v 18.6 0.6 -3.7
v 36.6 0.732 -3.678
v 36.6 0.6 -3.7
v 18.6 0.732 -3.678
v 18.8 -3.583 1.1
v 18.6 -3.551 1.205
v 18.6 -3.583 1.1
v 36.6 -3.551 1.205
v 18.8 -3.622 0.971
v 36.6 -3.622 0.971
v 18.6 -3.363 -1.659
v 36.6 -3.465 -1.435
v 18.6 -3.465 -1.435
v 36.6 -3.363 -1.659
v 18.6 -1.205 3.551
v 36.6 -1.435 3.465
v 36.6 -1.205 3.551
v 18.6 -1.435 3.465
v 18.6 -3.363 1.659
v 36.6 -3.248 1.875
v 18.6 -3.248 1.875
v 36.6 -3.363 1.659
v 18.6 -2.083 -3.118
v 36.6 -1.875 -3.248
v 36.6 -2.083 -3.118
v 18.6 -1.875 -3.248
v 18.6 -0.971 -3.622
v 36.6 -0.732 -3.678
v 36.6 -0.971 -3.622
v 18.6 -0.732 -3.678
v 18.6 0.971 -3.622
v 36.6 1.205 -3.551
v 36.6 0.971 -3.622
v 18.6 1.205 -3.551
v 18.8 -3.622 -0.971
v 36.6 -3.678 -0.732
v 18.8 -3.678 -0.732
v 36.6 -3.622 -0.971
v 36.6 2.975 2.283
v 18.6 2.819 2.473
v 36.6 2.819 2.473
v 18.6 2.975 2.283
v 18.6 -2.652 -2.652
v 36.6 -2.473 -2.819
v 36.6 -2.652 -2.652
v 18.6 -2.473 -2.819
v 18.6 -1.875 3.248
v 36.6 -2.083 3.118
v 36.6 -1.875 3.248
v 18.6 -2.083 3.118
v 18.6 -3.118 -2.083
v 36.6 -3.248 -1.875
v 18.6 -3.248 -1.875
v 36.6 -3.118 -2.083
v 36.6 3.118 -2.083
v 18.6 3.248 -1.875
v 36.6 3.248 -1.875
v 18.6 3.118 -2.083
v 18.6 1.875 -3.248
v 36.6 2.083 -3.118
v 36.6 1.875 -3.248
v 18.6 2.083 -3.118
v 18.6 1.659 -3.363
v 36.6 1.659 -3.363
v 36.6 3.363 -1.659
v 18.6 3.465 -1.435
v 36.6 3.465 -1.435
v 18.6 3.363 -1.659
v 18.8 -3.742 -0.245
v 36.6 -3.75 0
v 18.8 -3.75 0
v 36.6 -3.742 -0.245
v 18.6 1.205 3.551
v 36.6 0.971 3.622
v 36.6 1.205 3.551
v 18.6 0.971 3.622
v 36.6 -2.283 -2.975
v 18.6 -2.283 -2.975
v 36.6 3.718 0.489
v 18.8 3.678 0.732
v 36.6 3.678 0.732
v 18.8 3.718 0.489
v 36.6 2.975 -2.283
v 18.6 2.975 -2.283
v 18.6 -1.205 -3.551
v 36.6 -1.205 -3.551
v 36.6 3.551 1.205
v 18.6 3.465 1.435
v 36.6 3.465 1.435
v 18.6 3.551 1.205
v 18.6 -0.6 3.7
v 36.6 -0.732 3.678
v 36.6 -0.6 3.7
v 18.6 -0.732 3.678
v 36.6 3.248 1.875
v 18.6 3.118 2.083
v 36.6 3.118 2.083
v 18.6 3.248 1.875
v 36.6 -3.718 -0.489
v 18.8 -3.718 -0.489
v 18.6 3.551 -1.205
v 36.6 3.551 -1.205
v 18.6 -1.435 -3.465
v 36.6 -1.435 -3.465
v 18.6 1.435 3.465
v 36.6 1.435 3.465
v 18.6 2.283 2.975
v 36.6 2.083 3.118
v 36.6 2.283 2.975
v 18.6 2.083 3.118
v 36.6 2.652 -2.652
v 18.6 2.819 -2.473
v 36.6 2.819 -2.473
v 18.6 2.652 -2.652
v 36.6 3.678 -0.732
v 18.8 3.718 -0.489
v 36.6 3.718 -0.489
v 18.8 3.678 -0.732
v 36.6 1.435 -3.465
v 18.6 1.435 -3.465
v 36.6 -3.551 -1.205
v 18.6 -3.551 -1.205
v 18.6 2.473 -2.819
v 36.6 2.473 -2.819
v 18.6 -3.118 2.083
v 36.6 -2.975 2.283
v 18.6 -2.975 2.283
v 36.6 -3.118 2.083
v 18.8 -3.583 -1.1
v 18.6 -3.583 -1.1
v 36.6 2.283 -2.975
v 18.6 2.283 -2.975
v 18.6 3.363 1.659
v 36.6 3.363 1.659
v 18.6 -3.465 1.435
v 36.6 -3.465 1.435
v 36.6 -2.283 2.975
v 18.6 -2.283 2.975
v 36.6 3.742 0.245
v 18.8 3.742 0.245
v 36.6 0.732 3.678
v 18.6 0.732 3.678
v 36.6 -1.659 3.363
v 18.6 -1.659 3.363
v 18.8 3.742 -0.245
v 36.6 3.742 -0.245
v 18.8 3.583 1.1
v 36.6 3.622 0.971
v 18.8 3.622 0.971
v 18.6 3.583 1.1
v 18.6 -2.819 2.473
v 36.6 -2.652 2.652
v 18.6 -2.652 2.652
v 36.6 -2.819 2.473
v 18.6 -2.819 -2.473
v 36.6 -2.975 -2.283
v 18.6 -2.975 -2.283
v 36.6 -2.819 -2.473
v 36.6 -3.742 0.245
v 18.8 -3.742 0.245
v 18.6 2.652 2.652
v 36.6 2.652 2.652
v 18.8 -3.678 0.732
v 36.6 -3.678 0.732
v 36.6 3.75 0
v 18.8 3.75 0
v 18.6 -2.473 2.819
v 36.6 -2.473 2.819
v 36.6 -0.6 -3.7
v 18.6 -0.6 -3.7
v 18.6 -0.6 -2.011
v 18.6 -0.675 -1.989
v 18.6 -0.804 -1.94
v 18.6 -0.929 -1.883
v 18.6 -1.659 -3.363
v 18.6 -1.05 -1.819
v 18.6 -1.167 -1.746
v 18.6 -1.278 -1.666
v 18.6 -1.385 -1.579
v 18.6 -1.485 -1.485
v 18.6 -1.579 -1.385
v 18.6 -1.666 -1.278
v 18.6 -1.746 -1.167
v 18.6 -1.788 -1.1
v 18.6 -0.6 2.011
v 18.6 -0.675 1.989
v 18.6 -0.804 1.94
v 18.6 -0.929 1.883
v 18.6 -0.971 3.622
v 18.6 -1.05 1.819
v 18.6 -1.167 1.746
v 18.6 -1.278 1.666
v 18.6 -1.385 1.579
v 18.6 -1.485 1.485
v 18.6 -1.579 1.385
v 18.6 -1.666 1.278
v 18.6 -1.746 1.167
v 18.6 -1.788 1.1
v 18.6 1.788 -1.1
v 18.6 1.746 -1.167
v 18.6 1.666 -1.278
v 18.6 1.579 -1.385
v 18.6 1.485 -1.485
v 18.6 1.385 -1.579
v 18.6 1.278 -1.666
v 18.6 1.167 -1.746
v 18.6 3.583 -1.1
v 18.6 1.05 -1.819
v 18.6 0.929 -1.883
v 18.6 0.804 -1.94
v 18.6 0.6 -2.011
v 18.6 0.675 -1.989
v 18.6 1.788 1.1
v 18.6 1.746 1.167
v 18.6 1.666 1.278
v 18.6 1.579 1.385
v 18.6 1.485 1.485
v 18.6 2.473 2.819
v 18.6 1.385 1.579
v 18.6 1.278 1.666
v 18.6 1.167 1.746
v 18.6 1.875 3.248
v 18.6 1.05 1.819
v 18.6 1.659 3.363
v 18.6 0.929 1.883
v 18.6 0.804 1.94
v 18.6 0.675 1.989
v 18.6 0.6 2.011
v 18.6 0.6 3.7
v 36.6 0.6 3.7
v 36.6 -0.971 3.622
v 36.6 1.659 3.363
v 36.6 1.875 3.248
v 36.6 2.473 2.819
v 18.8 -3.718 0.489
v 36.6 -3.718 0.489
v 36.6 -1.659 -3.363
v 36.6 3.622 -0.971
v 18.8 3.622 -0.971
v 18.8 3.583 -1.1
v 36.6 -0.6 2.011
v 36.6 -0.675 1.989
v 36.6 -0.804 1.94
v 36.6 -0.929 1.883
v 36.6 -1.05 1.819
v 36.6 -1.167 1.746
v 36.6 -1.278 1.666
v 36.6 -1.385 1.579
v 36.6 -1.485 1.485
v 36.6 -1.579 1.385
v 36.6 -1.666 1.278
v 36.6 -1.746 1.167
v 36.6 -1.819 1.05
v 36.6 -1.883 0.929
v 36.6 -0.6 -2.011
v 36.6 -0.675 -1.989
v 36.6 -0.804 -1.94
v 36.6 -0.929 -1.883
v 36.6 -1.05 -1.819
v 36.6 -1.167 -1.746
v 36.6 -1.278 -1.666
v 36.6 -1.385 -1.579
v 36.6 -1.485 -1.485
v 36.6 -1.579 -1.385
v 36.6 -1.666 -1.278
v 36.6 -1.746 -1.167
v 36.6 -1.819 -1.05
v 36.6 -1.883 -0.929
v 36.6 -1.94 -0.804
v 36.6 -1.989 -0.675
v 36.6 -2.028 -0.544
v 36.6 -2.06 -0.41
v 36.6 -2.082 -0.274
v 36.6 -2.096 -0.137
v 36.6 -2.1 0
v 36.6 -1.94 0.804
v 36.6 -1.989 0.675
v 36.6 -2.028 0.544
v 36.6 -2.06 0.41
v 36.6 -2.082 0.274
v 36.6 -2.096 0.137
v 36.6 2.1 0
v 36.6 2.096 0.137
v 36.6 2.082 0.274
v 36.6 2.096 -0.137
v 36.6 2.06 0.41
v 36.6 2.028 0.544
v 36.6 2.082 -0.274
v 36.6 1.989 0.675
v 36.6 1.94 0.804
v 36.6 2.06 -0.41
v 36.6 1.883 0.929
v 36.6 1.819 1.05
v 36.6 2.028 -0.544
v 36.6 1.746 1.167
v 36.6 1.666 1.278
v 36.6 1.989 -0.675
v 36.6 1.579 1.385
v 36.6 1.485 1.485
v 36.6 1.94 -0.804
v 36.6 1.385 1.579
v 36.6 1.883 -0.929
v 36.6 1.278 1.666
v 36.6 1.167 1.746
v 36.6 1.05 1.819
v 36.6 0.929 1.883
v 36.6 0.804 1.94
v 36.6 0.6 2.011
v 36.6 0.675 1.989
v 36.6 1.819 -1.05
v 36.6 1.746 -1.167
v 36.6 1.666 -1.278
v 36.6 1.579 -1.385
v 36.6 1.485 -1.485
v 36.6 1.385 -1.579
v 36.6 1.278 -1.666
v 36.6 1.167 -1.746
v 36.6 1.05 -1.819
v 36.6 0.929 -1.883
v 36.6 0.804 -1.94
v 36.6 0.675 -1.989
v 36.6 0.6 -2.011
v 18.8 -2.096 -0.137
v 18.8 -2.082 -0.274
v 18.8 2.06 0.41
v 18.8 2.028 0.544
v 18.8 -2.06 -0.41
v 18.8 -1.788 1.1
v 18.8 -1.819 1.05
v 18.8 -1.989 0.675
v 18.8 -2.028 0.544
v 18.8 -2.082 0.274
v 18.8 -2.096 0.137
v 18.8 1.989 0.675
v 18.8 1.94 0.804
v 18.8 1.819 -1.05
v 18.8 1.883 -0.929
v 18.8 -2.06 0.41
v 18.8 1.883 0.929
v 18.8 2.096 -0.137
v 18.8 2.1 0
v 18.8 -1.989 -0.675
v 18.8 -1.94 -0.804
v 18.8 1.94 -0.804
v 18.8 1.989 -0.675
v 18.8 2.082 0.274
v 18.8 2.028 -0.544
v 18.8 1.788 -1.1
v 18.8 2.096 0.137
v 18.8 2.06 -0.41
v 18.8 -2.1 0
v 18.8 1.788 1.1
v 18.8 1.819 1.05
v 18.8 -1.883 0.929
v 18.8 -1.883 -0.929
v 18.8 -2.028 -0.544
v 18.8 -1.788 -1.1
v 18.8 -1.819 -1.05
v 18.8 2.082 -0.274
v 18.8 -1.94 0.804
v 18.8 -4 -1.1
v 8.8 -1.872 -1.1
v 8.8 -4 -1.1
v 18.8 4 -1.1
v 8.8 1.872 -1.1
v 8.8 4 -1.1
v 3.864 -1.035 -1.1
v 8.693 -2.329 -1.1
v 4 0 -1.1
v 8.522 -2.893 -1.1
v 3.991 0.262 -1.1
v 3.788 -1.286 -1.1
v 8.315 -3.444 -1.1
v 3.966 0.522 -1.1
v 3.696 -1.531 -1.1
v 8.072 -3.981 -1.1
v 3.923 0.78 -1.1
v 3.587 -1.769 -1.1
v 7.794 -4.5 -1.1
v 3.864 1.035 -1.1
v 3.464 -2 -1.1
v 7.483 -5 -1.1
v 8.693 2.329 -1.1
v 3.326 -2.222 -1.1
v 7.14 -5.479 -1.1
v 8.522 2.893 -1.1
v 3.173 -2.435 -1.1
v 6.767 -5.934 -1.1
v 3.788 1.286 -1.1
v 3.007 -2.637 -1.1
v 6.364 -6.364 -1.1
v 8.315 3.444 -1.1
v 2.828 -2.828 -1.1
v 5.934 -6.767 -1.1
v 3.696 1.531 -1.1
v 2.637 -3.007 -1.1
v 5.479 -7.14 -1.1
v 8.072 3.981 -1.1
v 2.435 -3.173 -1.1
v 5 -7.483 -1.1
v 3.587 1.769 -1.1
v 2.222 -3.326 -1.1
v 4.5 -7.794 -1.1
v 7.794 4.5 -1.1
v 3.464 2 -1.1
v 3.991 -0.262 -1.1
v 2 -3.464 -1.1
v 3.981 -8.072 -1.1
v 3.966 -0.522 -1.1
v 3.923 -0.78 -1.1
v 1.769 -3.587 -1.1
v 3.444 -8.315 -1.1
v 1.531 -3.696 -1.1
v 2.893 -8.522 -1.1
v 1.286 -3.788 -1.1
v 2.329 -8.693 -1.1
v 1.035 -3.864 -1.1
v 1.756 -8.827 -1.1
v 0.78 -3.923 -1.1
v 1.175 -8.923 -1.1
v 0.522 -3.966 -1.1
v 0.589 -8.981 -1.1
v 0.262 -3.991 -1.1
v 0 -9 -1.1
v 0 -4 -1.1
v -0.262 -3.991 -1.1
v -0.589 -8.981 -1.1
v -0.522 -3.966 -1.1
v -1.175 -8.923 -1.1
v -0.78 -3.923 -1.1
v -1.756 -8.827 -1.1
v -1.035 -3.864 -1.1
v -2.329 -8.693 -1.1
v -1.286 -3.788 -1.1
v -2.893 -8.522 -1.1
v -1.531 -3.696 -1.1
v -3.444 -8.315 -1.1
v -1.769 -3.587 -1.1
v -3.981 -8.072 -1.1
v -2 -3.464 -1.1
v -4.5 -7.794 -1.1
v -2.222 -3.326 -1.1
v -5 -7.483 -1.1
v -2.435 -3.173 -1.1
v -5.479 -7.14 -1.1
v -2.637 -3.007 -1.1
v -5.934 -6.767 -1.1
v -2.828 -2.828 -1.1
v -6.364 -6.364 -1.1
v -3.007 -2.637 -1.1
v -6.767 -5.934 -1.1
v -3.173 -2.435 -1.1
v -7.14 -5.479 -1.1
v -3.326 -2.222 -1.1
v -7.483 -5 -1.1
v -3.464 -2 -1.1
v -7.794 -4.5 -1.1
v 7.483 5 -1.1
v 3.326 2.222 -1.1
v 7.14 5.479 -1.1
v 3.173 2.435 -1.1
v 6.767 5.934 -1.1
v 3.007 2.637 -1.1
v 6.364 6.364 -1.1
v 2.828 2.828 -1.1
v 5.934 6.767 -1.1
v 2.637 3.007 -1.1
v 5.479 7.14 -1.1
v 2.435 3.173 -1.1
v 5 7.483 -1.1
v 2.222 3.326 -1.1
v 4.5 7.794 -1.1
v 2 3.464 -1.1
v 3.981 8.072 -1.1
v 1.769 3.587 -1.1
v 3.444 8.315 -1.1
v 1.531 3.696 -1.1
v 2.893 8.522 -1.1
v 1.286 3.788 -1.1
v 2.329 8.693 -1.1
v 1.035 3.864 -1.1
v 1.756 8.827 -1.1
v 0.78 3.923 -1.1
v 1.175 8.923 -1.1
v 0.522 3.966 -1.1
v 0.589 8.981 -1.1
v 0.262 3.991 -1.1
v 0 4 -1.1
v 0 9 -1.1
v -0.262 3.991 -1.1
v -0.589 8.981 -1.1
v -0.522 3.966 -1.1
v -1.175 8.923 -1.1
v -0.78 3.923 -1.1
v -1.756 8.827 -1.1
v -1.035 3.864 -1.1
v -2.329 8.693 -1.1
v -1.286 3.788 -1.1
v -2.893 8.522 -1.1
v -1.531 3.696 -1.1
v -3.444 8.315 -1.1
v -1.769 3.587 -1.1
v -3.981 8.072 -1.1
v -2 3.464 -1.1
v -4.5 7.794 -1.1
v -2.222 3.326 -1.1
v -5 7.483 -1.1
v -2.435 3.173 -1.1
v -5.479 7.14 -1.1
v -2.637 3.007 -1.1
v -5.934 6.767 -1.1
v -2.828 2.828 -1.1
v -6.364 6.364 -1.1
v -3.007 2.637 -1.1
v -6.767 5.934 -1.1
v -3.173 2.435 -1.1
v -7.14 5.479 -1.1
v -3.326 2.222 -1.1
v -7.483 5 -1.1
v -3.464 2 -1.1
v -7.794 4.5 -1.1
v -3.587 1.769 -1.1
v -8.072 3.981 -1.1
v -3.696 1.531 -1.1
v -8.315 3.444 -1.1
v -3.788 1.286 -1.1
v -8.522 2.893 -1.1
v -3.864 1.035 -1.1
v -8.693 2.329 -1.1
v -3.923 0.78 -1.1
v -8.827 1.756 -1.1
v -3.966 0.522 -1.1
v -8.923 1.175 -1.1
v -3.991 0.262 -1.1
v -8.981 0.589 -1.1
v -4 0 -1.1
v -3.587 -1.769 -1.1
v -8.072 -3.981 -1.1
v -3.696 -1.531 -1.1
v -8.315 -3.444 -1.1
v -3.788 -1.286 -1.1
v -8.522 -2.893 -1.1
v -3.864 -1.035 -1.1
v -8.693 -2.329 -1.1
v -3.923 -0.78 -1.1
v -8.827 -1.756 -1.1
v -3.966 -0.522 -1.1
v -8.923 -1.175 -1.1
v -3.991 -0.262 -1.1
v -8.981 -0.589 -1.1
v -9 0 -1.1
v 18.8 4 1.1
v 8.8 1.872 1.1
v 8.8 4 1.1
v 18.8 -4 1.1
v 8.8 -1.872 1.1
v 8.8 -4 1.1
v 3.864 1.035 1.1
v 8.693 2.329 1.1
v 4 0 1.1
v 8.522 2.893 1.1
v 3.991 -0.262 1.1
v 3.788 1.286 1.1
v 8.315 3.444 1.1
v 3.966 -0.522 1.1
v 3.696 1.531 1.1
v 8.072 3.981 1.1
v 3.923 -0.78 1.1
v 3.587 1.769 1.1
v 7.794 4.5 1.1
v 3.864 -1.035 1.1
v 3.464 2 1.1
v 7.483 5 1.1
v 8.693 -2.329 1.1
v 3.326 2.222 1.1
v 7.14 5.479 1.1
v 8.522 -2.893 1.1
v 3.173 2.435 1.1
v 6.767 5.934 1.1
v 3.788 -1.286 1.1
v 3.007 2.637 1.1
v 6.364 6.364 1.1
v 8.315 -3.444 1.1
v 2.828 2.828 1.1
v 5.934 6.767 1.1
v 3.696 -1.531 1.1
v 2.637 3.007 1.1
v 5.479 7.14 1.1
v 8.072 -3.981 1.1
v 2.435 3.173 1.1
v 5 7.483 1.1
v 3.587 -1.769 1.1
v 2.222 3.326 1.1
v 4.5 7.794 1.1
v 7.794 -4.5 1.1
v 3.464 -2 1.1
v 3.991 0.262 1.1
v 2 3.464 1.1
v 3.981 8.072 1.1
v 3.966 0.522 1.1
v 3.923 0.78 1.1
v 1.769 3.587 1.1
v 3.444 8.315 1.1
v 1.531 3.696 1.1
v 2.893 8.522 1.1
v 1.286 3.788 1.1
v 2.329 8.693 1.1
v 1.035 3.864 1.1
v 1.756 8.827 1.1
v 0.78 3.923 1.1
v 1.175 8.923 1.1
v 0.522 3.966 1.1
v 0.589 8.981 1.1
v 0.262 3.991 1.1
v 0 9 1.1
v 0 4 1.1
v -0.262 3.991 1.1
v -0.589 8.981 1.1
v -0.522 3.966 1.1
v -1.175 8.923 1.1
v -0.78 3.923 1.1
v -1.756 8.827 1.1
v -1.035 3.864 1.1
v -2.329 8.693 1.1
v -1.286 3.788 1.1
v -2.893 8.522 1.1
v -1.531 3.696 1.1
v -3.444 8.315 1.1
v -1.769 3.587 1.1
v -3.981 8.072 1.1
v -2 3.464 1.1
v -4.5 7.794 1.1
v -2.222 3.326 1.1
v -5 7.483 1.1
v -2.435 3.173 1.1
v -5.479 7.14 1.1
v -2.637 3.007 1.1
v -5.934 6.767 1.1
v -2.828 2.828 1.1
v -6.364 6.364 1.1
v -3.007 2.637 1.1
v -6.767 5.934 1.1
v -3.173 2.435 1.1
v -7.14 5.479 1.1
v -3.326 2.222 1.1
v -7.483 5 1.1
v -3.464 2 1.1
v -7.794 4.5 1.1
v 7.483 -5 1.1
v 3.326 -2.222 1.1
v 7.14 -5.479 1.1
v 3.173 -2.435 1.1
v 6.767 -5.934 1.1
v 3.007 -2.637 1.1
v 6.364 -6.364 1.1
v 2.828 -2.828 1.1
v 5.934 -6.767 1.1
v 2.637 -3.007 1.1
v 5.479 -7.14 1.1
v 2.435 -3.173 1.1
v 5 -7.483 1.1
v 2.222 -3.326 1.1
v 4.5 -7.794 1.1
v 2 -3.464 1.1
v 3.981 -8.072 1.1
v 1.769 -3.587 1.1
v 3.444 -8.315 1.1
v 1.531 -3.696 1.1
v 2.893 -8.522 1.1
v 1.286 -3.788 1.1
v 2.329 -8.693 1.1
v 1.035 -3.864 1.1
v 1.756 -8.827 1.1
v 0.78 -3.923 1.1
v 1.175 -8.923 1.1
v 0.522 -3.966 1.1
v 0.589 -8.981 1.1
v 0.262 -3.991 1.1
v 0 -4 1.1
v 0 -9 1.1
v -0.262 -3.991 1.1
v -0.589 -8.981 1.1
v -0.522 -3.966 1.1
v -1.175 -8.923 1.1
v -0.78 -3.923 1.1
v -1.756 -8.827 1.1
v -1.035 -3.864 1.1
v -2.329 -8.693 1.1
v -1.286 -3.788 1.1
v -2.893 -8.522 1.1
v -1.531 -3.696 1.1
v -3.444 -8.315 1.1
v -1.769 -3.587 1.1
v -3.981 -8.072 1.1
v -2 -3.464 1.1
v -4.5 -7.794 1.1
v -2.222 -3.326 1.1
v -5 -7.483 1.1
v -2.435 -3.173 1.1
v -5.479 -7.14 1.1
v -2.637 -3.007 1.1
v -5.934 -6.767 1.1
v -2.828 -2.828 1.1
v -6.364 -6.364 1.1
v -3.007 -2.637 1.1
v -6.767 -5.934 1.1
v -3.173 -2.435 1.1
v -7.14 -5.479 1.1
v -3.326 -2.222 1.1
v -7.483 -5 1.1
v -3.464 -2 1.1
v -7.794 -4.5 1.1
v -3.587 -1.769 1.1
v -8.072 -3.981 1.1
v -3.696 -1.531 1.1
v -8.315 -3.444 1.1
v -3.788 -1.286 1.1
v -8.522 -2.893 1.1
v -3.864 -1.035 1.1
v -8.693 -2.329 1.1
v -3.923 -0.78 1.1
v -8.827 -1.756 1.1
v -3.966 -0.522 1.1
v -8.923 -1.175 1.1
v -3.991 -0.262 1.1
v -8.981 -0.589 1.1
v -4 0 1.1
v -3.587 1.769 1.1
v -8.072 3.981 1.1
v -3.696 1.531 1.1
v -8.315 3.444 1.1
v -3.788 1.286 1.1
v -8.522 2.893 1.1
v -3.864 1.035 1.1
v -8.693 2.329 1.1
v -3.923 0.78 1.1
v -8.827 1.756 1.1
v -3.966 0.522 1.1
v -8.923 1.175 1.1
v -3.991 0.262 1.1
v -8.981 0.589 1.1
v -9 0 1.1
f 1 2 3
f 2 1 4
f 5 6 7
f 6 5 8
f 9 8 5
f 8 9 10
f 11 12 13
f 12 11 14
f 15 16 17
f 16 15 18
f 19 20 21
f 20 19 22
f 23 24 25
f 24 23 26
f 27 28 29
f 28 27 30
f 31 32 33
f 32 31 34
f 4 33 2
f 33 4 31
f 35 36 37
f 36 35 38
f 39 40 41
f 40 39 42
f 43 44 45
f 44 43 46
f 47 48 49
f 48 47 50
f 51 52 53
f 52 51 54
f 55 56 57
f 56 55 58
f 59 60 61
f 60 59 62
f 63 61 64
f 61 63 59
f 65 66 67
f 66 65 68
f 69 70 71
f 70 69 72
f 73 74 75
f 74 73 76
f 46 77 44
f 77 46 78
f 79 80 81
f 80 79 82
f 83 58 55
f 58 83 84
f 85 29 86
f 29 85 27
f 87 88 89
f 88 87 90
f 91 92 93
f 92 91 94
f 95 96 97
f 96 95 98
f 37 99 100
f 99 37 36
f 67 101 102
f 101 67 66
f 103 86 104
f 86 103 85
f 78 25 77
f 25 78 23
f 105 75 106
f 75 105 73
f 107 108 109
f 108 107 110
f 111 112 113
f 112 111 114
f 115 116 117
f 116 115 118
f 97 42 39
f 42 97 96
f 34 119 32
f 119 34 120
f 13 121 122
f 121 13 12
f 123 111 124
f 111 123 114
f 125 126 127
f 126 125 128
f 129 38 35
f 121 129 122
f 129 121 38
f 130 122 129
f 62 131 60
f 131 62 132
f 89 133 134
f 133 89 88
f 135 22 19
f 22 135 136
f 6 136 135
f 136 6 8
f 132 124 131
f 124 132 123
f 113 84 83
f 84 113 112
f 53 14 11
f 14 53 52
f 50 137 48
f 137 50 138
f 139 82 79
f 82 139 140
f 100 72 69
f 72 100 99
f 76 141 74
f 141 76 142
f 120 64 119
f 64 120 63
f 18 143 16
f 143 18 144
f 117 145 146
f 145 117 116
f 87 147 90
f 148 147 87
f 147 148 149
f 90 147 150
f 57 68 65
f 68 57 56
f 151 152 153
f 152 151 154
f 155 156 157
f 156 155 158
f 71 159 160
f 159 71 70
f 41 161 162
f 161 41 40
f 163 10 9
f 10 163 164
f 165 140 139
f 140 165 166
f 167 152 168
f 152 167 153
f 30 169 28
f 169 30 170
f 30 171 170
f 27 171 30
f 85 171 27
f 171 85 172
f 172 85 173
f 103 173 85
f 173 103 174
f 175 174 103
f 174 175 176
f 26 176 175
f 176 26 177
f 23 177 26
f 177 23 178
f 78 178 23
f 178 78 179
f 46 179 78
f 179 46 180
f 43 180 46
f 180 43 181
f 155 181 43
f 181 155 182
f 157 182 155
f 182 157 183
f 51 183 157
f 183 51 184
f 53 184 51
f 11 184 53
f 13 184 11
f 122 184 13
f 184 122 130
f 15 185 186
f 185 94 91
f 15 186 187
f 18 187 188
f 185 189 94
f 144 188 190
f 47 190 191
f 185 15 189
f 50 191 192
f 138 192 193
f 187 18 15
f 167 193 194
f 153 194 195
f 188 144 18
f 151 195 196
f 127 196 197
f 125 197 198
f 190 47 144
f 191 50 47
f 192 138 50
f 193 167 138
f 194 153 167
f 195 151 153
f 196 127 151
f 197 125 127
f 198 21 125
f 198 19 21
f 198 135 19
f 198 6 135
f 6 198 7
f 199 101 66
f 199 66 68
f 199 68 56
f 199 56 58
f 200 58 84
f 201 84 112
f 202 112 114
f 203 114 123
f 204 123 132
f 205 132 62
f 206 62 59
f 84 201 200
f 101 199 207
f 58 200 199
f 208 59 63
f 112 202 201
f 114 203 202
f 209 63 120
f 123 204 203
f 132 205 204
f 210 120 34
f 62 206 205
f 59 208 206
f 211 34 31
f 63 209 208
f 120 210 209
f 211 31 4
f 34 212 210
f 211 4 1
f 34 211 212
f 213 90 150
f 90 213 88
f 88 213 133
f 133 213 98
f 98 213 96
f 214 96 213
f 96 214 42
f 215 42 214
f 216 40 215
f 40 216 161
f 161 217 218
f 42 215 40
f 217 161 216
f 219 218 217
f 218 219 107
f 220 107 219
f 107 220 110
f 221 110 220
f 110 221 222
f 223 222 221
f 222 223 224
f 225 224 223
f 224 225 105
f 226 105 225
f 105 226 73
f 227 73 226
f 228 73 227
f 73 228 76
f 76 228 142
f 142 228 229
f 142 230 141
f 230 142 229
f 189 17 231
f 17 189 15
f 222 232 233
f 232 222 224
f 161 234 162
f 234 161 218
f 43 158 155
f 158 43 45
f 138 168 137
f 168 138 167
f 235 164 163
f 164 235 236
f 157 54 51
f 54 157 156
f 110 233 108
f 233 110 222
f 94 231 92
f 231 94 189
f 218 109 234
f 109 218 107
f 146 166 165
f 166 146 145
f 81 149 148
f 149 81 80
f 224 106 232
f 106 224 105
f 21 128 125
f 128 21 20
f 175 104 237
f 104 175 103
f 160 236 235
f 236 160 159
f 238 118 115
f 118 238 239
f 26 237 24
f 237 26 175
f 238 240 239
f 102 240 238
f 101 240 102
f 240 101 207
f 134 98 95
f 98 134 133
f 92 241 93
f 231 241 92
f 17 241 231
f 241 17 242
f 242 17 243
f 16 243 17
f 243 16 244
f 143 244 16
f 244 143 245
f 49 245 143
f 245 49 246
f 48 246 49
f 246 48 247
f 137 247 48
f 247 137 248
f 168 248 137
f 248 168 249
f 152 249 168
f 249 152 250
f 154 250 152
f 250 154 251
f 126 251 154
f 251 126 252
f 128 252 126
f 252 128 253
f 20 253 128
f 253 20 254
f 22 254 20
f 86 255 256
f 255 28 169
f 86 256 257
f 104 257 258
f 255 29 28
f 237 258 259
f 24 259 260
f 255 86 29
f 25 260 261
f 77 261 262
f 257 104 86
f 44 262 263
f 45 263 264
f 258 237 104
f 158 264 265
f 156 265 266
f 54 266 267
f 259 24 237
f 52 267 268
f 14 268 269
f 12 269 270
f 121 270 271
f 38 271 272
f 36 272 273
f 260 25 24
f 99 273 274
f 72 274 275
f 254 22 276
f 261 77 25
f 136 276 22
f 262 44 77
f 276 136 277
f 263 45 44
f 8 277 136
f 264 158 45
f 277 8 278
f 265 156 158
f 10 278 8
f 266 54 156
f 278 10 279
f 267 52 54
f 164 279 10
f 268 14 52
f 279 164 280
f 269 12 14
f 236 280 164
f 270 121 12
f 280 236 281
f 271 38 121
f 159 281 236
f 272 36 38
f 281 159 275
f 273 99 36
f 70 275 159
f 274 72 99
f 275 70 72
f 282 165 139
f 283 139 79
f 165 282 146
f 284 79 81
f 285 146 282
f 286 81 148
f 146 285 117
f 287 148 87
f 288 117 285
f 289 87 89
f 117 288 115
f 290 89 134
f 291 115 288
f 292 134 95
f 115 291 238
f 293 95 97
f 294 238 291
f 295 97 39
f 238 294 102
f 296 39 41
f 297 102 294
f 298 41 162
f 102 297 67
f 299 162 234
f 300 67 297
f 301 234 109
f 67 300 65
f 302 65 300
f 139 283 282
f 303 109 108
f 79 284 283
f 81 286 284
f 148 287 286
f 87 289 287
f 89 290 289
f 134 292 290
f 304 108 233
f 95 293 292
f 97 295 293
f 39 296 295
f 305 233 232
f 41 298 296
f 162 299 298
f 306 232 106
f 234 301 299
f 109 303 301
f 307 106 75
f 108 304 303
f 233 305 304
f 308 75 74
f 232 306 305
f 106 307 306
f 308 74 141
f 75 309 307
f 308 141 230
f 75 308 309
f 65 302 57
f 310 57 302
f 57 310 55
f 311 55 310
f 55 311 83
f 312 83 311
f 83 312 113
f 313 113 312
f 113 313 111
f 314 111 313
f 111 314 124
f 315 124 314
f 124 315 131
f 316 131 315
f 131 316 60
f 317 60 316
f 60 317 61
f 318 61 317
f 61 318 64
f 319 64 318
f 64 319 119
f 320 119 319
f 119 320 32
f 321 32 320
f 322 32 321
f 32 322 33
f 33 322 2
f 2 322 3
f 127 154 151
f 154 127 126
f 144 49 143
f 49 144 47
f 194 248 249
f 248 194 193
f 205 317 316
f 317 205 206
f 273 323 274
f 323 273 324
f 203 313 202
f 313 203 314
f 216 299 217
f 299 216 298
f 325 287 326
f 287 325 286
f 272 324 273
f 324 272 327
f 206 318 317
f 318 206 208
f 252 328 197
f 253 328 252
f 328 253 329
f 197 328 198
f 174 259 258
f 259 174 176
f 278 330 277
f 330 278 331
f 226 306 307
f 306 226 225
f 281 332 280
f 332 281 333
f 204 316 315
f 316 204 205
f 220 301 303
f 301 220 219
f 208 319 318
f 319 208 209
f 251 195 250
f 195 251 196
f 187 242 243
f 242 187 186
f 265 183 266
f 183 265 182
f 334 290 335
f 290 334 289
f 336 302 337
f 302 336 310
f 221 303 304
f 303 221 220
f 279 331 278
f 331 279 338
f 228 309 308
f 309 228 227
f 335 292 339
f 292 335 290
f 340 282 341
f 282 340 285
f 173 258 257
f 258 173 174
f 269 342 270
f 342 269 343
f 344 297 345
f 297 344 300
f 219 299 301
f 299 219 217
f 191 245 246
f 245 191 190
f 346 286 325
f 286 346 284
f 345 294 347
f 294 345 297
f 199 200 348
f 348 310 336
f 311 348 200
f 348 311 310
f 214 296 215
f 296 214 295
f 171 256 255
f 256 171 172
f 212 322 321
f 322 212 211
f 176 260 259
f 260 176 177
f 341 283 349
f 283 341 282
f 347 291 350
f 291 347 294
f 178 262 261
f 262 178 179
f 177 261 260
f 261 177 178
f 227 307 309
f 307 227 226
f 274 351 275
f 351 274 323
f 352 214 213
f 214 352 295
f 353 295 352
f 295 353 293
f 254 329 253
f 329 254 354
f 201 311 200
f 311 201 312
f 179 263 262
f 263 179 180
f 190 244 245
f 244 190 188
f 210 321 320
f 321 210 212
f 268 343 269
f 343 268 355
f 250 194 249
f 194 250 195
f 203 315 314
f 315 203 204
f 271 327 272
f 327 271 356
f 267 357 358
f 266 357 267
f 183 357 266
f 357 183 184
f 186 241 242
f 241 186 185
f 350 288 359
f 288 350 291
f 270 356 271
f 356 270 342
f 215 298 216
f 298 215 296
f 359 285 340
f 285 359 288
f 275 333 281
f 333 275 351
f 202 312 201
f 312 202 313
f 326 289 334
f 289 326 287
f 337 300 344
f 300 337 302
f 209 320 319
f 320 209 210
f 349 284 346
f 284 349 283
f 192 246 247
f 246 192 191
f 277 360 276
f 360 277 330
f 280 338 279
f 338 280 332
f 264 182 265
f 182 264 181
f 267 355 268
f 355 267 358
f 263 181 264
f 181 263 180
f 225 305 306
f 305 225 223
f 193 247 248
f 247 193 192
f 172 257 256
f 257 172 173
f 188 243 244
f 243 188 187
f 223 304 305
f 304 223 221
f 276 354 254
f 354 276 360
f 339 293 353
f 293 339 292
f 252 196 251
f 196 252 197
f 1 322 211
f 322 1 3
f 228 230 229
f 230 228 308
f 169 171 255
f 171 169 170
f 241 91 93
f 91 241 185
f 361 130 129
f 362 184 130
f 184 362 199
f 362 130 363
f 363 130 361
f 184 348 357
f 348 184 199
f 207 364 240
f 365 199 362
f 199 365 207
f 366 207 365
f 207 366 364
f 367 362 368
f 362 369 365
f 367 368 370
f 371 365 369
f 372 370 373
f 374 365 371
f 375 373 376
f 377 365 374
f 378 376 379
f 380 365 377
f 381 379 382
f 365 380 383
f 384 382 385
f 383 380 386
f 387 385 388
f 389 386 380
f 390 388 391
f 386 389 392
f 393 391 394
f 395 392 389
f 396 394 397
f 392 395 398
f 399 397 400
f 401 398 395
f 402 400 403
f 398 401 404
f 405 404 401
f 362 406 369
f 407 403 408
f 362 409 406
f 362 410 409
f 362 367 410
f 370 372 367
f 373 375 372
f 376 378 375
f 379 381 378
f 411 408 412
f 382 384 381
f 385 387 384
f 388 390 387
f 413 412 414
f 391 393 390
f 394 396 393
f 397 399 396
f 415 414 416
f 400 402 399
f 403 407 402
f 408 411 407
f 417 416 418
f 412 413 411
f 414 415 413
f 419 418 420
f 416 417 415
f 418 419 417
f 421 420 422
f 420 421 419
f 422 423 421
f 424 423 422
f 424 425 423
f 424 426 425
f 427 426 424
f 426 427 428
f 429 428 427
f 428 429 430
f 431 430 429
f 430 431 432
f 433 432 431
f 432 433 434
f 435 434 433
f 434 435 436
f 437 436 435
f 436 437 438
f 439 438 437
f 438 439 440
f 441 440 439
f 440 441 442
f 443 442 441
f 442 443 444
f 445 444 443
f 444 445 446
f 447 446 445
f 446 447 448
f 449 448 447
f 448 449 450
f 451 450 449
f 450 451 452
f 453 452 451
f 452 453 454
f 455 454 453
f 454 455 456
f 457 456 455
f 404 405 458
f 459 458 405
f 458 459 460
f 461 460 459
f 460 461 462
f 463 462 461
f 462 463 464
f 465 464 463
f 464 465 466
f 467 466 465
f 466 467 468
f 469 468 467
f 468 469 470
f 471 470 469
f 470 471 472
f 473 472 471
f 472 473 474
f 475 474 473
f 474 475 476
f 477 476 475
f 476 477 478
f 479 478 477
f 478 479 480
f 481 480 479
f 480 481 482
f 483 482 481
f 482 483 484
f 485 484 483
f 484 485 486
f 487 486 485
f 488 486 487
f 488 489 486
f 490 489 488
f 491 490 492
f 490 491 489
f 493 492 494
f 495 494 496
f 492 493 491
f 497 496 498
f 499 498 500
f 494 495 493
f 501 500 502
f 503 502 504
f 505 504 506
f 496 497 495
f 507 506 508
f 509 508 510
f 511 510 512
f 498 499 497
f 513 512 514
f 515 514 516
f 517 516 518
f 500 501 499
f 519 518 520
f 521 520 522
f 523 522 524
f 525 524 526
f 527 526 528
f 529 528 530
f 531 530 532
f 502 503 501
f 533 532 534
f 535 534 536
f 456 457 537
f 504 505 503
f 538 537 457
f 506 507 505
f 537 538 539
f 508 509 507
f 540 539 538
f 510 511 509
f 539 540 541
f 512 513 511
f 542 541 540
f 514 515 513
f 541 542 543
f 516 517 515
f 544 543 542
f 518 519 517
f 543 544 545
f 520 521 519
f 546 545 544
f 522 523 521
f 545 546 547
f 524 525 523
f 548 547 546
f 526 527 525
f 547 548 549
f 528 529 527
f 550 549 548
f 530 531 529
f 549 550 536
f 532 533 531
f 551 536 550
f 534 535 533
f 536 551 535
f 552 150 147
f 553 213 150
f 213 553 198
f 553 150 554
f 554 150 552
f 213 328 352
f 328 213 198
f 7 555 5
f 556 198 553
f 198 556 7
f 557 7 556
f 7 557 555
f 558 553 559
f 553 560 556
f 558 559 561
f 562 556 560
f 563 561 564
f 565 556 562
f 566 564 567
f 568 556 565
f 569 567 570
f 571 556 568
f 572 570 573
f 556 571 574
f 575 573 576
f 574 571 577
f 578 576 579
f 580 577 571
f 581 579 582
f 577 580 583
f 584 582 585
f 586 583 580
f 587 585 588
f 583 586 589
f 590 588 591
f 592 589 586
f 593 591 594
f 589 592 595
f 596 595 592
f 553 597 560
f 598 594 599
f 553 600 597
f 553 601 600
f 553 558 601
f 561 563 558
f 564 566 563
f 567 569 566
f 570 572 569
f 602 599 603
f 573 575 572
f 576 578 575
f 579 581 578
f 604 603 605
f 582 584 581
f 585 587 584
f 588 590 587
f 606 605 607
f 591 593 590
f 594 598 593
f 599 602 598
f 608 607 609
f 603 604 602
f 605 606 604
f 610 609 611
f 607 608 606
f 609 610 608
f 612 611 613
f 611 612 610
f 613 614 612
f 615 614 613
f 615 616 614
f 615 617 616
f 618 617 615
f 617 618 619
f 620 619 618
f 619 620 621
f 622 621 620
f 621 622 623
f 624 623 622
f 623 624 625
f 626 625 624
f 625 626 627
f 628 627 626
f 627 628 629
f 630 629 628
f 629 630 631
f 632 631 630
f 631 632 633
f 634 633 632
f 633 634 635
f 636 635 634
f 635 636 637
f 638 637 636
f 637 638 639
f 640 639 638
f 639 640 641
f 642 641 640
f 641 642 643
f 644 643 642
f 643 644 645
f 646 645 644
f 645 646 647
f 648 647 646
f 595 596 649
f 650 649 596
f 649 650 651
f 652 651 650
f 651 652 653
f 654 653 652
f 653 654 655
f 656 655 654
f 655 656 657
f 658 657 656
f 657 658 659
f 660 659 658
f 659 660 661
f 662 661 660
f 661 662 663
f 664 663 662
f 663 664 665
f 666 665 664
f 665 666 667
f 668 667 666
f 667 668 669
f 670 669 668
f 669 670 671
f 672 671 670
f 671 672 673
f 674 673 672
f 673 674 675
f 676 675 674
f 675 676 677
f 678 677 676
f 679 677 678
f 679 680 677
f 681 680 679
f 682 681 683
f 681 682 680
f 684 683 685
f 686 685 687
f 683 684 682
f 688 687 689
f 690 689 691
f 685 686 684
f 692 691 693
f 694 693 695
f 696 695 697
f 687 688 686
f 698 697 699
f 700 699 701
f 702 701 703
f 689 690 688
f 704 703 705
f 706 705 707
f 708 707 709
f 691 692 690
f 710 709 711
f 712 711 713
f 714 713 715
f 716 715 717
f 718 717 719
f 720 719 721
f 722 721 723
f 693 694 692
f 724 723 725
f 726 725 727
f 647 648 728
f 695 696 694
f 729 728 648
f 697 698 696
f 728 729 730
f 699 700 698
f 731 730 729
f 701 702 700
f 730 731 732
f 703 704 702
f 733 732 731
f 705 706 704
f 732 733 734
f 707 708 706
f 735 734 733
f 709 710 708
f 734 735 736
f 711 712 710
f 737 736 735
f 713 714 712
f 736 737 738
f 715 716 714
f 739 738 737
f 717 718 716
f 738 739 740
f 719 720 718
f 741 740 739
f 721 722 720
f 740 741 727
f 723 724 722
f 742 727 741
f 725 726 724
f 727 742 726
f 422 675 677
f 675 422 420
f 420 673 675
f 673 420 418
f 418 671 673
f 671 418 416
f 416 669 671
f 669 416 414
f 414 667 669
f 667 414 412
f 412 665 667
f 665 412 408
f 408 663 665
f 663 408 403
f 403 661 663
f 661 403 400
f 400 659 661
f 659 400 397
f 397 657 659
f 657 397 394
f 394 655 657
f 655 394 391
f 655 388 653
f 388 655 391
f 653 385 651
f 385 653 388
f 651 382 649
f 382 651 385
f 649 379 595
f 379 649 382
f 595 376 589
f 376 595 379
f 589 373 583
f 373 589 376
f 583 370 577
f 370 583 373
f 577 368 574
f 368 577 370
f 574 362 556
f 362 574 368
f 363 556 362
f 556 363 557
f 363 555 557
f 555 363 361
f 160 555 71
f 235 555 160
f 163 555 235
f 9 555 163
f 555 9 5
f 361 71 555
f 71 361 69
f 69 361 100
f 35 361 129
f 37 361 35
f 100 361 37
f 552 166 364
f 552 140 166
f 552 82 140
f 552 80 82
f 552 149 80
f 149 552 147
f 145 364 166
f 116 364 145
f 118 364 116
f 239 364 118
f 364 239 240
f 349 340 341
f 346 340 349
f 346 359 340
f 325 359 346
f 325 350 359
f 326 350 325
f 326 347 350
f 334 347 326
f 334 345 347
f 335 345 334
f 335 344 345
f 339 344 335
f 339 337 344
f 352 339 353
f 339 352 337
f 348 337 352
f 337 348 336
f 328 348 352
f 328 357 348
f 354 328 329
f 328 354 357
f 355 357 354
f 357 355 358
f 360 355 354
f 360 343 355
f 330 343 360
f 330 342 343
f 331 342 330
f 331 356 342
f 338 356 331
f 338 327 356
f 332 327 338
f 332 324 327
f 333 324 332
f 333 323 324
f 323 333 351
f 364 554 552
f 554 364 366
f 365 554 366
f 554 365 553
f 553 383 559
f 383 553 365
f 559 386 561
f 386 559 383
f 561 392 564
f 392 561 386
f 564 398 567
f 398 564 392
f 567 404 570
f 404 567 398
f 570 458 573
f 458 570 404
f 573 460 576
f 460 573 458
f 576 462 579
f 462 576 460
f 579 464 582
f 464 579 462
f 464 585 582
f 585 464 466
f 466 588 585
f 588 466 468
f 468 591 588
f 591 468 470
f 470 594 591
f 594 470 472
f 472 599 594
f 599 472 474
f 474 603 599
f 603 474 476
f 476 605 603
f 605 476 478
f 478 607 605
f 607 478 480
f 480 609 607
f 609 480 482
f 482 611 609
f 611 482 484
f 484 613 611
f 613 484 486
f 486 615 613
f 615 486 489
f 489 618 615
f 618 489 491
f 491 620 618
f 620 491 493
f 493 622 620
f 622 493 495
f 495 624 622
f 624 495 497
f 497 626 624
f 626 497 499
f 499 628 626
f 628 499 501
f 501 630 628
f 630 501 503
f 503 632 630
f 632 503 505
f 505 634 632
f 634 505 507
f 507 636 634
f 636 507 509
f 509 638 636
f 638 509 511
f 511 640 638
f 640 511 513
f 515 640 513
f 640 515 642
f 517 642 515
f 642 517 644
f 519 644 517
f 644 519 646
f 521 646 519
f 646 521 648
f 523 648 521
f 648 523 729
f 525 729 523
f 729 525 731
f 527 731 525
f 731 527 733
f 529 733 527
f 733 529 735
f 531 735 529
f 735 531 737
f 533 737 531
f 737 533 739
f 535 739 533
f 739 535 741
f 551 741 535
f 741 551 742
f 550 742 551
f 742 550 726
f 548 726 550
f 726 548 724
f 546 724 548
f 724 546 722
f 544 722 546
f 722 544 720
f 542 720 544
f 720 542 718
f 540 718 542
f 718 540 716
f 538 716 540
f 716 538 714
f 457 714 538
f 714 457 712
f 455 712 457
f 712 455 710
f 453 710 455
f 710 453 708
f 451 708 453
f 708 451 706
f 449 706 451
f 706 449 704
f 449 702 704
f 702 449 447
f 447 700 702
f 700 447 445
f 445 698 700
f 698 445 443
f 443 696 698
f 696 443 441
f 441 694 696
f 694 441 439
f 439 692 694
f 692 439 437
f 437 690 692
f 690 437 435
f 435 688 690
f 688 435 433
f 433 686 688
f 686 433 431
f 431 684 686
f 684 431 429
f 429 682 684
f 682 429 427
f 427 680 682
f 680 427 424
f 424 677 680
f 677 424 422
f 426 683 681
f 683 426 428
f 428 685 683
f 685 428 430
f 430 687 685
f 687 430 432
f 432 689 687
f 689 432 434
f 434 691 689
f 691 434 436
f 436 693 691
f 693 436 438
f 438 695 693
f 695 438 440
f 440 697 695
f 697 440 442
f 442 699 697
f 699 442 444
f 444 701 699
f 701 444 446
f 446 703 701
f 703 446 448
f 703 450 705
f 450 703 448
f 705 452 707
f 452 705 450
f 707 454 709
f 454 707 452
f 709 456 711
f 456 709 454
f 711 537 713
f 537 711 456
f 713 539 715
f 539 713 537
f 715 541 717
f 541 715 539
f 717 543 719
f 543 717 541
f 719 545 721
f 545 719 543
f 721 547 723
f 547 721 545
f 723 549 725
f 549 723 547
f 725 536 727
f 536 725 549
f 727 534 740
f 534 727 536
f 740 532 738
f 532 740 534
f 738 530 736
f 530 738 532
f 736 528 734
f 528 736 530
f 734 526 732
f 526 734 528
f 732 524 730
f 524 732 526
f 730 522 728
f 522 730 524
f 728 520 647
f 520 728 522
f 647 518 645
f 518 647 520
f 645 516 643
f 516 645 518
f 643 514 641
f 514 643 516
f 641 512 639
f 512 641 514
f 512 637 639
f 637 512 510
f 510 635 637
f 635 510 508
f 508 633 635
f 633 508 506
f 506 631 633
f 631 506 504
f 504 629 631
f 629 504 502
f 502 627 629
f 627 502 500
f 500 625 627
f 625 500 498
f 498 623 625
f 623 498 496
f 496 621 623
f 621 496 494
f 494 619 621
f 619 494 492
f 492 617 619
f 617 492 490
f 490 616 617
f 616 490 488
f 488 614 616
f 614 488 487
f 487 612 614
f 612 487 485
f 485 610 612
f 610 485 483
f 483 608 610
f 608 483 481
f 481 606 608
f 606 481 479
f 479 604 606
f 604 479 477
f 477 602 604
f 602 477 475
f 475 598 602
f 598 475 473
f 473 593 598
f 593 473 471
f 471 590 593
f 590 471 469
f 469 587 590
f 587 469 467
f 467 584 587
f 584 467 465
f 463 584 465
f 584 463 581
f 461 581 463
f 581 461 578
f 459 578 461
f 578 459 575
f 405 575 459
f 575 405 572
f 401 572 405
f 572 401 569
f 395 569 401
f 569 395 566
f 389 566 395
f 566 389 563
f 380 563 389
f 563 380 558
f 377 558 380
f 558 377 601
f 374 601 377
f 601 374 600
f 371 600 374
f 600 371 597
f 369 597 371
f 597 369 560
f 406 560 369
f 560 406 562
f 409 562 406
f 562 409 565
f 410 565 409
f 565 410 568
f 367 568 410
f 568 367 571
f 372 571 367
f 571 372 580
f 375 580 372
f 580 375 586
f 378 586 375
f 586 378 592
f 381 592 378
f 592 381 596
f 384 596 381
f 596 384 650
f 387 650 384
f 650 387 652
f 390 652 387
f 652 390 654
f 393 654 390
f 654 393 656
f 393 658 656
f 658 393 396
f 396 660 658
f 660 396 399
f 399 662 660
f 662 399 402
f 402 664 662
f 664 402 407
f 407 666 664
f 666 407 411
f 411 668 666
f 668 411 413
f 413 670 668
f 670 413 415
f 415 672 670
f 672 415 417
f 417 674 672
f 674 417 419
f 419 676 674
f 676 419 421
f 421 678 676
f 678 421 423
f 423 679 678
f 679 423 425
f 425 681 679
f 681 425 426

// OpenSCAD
$fn=96;

module ring_terminal(
    ring_od=18,
    ring_id=8,
    ring_th=2.2,
    neck_len=10,
    neck_w=8,
    barrel_len=18,
    barrel_od=7.5,
    barrel_id=4.2,
    slit_w=1.2
){
    union(){
        // Ring + neck (flat)
        linear_extrude(height=ring_th, center=true)
        union(){
            difference(){
                circle(d=ring_od);
                circle(d=ring_id);
            }
            translate([ (ring_od/2 + neck_len/2) - 0.2, 0 ])
                square([neck_len, neck_w], center=true);
        }

        // Barrel (hollow cylinder) attached to neck
        translate([ ring_od/2 + neck_len + barrel_len/2 - 0.4, 0, 0 ])
        difference(){
            rotate([0,90,0]) cylinder(d=barrel_od, h=barrel_len, center=true);
            rotate([0,90,0]) cylinder(d=barrel_id, h=barrel_len+0.6, center=true);
            // Crimp slit
            translate([0,0,0])
                cube([barrel_len+1, slit_w, barrel_od+2], center=true);
        }
    }
}

ring_terminal();
